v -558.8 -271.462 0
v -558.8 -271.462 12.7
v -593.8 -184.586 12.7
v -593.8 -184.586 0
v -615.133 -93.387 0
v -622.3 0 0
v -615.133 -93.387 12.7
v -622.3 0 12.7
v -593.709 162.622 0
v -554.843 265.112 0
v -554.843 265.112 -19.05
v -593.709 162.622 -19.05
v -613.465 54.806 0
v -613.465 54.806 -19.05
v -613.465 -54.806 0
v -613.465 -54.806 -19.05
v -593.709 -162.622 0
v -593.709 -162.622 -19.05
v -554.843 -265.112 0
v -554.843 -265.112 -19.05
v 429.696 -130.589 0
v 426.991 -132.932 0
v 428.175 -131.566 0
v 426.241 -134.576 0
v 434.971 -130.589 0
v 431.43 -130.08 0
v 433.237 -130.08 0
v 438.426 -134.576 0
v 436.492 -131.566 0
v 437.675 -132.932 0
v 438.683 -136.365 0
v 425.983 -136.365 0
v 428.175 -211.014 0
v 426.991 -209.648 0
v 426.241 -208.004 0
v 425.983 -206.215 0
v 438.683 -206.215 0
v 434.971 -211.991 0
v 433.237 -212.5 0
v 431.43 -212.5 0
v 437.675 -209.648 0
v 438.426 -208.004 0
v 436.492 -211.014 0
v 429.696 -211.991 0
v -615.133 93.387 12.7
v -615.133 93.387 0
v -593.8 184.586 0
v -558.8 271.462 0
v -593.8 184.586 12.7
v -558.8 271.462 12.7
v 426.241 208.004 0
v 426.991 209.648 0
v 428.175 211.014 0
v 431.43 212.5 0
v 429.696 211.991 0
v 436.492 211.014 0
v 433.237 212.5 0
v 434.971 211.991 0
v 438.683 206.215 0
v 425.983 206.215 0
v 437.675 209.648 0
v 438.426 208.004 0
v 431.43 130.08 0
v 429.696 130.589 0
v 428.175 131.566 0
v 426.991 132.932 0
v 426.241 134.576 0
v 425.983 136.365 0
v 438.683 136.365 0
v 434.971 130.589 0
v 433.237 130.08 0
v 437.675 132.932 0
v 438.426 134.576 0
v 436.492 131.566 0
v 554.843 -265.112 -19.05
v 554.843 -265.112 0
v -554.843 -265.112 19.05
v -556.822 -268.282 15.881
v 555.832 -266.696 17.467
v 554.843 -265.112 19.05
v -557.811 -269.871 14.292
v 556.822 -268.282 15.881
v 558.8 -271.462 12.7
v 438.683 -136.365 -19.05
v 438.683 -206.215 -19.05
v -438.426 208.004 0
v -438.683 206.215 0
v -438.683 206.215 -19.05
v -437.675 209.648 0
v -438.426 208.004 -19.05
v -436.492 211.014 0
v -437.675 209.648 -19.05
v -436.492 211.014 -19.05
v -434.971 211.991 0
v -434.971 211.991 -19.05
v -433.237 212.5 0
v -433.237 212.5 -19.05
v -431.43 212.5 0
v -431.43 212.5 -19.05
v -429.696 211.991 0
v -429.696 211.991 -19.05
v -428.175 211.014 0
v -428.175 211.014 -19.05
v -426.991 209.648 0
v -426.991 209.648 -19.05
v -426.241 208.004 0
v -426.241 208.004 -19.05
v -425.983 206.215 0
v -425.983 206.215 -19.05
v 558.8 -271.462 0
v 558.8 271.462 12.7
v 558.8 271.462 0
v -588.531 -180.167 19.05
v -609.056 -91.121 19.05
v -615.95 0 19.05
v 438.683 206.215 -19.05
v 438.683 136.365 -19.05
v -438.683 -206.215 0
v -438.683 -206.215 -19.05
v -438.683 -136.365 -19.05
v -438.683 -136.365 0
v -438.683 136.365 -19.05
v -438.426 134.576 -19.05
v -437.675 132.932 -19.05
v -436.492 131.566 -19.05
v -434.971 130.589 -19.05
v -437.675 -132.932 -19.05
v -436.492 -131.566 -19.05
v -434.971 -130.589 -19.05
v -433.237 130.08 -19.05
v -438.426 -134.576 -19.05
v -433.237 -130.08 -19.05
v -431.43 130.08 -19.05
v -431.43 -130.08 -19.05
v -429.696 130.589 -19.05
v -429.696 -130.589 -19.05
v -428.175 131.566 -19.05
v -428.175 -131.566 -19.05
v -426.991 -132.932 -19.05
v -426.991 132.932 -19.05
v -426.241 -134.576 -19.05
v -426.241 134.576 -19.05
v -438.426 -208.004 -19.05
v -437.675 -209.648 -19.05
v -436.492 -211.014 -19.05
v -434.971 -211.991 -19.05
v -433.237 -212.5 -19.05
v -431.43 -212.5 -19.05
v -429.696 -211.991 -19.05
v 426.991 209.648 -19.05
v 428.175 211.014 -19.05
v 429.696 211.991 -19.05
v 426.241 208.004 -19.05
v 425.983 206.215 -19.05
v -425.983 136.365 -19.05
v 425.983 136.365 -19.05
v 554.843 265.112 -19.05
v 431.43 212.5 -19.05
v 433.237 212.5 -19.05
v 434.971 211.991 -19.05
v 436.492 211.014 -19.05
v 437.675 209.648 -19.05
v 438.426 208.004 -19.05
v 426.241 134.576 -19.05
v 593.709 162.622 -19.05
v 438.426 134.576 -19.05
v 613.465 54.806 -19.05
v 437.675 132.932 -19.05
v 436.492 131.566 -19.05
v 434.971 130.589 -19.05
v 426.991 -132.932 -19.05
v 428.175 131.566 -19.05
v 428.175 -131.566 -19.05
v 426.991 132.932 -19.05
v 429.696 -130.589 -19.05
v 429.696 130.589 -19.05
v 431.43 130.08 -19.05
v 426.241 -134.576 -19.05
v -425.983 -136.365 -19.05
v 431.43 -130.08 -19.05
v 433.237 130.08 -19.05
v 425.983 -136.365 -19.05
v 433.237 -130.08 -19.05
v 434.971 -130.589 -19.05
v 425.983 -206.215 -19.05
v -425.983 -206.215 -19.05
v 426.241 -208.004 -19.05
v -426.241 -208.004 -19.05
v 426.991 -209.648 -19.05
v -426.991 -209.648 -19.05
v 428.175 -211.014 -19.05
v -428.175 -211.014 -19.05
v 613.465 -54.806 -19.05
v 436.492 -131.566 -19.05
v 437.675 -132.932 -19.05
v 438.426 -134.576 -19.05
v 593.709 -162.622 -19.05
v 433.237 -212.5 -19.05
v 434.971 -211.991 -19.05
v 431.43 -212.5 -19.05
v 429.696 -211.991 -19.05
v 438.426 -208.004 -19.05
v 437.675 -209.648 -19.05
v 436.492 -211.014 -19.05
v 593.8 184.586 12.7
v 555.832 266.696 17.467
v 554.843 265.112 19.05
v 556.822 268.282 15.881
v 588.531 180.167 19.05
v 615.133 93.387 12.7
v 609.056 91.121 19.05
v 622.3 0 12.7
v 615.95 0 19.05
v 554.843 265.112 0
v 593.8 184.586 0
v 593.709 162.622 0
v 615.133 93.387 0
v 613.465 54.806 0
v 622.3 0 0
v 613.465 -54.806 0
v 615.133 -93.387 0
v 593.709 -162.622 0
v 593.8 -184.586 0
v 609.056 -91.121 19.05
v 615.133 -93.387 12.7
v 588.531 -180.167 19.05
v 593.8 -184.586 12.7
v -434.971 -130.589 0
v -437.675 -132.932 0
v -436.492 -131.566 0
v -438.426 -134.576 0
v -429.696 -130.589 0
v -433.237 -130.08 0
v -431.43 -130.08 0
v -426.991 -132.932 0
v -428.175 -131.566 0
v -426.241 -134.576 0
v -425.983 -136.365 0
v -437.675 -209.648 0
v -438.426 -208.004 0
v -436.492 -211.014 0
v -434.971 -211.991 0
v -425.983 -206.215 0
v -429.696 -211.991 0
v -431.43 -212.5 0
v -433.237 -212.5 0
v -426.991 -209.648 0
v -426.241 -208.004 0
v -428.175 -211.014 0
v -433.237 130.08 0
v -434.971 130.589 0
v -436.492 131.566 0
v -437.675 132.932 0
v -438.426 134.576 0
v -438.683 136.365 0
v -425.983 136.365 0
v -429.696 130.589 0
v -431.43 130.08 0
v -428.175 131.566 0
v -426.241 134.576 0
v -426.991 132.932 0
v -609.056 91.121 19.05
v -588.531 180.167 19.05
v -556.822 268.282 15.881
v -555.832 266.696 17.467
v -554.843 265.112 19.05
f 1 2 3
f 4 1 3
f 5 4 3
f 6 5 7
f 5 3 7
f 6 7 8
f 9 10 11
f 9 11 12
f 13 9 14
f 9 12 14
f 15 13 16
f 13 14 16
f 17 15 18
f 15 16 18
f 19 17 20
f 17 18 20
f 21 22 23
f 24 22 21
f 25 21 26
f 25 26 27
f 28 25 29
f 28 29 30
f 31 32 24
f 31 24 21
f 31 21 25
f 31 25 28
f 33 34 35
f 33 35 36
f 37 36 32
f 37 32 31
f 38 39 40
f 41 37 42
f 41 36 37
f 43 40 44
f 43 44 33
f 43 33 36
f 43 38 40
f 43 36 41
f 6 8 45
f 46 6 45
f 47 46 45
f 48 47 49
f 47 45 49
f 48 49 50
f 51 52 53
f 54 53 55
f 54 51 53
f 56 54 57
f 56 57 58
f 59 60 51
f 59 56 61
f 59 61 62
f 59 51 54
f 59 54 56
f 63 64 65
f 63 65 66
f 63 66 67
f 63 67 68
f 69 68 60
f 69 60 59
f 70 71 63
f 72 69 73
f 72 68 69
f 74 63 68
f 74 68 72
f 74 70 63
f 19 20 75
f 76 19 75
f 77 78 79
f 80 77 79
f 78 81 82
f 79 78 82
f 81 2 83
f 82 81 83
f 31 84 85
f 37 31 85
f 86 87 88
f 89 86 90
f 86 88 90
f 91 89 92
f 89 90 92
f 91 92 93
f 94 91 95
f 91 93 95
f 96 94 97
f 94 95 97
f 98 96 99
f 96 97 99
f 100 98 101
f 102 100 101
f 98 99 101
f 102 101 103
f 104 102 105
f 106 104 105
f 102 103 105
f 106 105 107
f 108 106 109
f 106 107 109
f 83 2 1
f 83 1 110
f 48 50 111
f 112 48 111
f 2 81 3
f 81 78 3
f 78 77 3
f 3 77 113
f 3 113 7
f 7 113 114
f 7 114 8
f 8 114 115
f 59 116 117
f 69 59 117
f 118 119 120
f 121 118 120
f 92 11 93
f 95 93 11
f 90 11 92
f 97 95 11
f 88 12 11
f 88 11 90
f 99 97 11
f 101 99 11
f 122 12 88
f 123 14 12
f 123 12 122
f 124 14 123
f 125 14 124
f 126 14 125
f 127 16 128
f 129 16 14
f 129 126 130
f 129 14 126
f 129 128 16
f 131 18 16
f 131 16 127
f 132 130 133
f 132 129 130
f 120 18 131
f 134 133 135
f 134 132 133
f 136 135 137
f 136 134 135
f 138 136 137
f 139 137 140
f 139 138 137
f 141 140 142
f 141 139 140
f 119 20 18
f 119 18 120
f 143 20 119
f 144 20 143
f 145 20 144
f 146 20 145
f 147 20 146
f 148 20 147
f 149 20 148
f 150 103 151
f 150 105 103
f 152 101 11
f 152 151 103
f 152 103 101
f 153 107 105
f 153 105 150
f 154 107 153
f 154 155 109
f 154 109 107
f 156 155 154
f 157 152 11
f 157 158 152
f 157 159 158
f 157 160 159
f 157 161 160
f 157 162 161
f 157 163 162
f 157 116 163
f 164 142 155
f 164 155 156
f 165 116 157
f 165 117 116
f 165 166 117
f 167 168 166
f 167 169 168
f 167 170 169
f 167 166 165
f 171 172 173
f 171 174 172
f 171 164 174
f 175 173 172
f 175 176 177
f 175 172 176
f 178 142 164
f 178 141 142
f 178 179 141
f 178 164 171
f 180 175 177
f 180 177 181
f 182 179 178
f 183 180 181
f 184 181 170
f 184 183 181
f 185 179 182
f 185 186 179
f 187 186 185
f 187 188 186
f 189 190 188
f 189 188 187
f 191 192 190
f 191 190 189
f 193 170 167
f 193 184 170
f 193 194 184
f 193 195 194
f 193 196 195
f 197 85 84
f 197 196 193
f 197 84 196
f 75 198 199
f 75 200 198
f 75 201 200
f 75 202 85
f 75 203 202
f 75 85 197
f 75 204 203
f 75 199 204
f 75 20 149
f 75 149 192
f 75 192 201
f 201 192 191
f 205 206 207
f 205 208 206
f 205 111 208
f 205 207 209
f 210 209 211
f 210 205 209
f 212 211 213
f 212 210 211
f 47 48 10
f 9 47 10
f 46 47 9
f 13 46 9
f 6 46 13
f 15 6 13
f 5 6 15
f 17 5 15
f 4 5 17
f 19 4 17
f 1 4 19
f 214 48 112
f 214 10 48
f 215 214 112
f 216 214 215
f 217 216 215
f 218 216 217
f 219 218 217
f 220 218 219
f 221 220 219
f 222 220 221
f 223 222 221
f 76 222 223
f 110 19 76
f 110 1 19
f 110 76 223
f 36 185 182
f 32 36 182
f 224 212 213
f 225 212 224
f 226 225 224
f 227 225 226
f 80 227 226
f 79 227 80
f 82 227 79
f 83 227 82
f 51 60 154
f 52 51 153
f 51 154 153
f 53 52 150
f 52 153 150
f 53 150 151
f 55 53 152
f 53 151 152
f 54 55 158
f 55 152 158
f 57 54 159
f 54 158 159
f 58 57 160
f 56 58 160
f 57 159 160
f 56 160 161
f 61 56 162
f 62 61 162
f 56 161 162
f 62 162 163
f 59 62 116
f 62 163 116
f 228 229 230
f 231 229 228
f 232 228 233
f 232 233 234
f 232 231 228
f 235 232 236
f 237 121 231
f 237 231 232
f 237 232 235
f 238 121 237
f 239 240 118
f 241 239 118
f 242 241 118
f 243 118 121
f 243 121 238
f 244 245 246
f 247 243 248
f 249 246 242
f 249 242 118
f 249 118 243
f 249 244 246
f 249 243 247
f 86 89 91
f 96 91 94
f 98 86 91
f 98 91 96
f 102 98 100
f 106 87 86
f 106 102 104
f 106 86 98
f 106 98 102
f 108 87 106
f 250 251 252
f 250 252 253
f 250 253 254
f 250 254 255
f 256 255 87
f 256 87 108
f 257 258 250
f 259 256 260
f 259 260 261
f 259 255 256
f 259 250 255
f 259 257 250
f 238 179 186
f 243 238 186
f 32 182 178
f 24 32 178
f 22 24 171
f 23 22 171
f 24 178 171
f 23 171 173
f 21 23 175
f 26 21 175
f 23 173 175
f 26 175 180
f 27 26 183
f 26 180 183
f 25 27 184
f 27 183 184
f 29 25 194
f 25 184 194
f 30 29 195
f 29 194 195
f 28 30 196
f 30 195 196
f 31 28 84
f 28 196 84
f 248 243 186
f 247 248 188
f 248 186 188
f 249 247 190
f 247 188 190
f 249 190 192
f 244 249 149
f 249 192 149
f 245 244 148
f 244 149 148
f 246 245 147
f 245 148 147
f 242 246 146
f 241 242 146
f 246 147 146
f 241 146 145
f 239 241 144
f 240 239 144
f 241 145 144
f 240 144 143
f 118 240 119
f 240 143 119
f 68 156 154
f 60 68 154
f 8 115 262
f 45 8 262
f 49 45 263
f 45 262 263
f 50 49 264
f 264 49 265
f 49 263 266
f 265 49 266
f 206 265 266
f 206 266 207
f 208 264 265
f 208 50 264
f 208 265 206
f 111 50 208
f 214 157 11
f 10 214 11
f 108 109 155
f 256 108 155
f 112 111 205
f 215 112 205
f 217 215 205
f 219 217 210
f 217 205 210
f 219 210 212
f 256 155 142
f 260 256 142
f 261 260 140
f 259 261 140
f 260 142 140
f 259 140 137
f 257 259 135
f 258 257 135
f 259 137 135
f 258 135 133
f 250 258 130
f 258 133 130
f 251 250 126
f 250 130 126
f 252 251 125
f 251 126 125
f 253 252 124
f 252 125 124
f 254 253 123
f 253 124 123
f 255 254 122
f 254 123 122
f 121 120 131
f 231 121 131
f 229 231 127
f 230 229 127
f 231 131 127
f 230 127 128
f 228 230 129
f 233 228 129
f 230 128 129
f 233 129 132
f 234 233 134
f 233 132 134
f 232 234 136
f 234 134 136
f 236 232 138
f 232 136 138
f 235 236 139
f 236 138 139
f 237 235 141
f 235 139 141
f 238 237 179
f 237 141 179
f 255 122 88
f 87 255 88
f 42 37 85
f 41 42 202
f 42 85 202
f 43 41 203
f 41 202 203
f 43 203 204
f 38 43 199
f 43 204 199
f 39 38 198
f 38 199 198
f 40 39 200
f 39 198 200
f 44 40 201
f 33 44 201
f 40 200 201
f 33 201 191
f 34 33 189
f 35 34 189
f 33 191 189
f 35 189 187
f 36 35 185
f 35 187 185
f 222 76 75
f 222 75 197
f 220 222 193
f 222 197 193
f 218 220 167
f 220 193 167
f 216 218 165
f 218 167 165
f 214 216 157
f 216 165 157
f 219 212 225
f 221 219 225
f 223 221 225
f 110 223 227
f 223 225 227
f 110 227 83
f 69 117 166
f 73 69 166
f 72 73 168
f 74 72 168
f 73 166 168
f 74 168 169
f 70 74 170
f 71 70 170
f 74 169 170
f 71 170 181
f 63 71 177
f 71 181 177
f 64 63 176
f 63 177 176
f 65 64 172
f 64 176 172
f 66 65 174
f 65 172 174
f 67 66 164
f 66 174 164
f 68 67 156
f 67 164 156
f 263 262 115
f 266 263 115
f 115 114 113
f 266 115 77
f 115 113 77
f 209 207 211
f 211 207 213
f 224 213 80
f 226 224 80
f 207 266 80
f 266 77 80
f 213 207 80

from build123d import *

# Parameters (mm, degrees)
F0_W     = 1244.6
F0_H     = 38.1
F1_DEPTH = 271.4625
F3_DEPTH = 38.101
F4_SIZE  = 6.35
F6_DEPTH = 19.05
F8_DEPTH = 19.05


with BuildPart() as f1:
    # F0 (on Front) → F1 (new body, symmetric)
    with BuildSketch(Plane.XZ):
        Rectangle(F0_W, F0_H)
    extrude(amount=F1_DEPTH, both=True)

    # F2 (on face) → F3 (cut, through all)
    with BuildSketch(Plane.XY.offset(19.05)):
        with BuildLine():
            ThreePointArc((-622.3, 0), (-606.213585, 139.395246), (-558.8, 271.4625))
            Line((-558.8, 271.4625), (-622.3, 271.4625))
            Line((-622.3, 271.4625), (-622.3, 0))
        make_face()
        with BuildLine():
            ThreePointArc((-558.8, -271.4625), (-606.213585, -139.395246), (-622.3, 0))
            Line((-622.3, 0), (-622.3, -271.4625))
            Line((-622.3, -271.4625), (-558.8, -271.4625))
        make_face()
        with BuildLine():
            Line((622.3, 271.4625), (558.8, 271.4625))
            ThreePointArc((558.8, 271.4625), (606.213585, 139.395246), (622.3, 0))
            Line((622.3, 0), (622.3, 271.4625))
        make_face()
        with BuildLine():
            Line((622.3, -271.4625), (622.3, 0))
            ThreePointArc((622.3, 0), (606.213585, -139.395246), (558.8, -271.4625))
            Line((558.8, -271.4625), (622.3, -271.4625))
        make_face()
    extrude(amount=-F3_DEPTH, mode=Mode.SUBTRACT)

    # F4
    f4_edges = [f1.edges().sort_by_distance(p)[0] for p in [
        (622.3, 0, 19.05),
        (0, 271.4625, 19.05),
        (-622.3, 0, 19.05),
        (0, -271.4625, 19.05),
    ]]
    chamfer(f4_edges, length=F4_SIZE)

    # F5 (on face) → F6 (cut)
    with BuildSketch(Plane(origin=(0, 0, -19.05), x_dir=(1, 0, 0), z_dir=(0, 0, -1))):
        with BuildLine():
            ThreePointArc((558.8, -271.4625), (622.3, 0), (558.8, 271.4625))
            Line((558.8, 271.4625), (-558.8, 271.4625))
            ThreePointArc((-558.8, 271.4625), (-622.3, 0), (-558.8, -271.4625))
            Line((-558.8, -271.4625), (558.8, -271.4625))
        make_face()
        with BuildLine():
            ThreePointArc((-554.843312, -265.1125), (-615.95, 0), (-554.843312, 265.1125))
            Line((-554.843312, 265.1125), (554.843312, 265.1125))
            ThreePointArc((554.843312, 265.1125), (615.95, 0), (554.843312, -265.1125))
            Line((554.843312, -265.1125), (-554.843312, -265.1125))
        make_face(mode=Mode.SUBTRACT)
    extrude(amount=-F6_DEPTH, mode=Mode.SUBTRACT)

    # F7 (on face) → F8 (cut)
    with BuildSketch(Plane(origin=(0, 0, -19.05), x_dir=(1, 0, 0), z_dir=(0, 0, -1))):
        with BuildLine():
            ThreePointArc((-438.6834, 136.36498), (-432.3334, 130.01498), (-425.9834, 136.36498))
            Line((-425.9834, 136.36498), (-425.9834, 206.21498))
            ThreePointArc((-425.9834, 206.21498), (-432.3334, 212.56498), (-438.6834, 206.21498))
            Line((-438.6834, 206.21498), (-438.6834, 136.36498))
        make_face()
        with BuildLine():
            ThreePointArc((-425.9834, -136.36498), (-432.3334, -130.01498), (-438.6834, -136.36498))
            Line((-438.6834, -136.36498), (-438.6834, -206.21498))
            ThreePointArc((-438.6834, -206.21498), (-432.3334, -212.56498), (-425.9834, -206.21498))
            Line((-425.9834, -206.21498), (-425.9834, -136.36498))
        make_face()
        with BuildLine():
            Line((438.6834, -206.21498), (438.6834, -136.36498))
            ThreePointArc((438.6834, -136.36498), (432.3334, -130.01498), (425.9834, -136.36498))
            Line((425.9834, -136.36498), (425.9834, -206.21498))
            ThreePointArc((425.9834, -206.21498), (432.3334, -212.56498), (438.6834, -206.21498))
        make_face()
        with BuildLine():
            ThreePointArc((425.9834, 136.36498), (432.3334, 130.01498), (438.6834, 136.36498))
            Line((438.6834, 136.36498), (438.6834, 206.21498))
            ThreePointArc((438.6834, 206.21498), (432.3334, 212.56498), (425.9834, 206.21498))
            Line((425.9834, 206.21498), (425.9834, 136.36498))
        make_face()
    extrude(amount=-F8_DEPTH, mode=Mode.SUBTRACT)


solid = f1.part
